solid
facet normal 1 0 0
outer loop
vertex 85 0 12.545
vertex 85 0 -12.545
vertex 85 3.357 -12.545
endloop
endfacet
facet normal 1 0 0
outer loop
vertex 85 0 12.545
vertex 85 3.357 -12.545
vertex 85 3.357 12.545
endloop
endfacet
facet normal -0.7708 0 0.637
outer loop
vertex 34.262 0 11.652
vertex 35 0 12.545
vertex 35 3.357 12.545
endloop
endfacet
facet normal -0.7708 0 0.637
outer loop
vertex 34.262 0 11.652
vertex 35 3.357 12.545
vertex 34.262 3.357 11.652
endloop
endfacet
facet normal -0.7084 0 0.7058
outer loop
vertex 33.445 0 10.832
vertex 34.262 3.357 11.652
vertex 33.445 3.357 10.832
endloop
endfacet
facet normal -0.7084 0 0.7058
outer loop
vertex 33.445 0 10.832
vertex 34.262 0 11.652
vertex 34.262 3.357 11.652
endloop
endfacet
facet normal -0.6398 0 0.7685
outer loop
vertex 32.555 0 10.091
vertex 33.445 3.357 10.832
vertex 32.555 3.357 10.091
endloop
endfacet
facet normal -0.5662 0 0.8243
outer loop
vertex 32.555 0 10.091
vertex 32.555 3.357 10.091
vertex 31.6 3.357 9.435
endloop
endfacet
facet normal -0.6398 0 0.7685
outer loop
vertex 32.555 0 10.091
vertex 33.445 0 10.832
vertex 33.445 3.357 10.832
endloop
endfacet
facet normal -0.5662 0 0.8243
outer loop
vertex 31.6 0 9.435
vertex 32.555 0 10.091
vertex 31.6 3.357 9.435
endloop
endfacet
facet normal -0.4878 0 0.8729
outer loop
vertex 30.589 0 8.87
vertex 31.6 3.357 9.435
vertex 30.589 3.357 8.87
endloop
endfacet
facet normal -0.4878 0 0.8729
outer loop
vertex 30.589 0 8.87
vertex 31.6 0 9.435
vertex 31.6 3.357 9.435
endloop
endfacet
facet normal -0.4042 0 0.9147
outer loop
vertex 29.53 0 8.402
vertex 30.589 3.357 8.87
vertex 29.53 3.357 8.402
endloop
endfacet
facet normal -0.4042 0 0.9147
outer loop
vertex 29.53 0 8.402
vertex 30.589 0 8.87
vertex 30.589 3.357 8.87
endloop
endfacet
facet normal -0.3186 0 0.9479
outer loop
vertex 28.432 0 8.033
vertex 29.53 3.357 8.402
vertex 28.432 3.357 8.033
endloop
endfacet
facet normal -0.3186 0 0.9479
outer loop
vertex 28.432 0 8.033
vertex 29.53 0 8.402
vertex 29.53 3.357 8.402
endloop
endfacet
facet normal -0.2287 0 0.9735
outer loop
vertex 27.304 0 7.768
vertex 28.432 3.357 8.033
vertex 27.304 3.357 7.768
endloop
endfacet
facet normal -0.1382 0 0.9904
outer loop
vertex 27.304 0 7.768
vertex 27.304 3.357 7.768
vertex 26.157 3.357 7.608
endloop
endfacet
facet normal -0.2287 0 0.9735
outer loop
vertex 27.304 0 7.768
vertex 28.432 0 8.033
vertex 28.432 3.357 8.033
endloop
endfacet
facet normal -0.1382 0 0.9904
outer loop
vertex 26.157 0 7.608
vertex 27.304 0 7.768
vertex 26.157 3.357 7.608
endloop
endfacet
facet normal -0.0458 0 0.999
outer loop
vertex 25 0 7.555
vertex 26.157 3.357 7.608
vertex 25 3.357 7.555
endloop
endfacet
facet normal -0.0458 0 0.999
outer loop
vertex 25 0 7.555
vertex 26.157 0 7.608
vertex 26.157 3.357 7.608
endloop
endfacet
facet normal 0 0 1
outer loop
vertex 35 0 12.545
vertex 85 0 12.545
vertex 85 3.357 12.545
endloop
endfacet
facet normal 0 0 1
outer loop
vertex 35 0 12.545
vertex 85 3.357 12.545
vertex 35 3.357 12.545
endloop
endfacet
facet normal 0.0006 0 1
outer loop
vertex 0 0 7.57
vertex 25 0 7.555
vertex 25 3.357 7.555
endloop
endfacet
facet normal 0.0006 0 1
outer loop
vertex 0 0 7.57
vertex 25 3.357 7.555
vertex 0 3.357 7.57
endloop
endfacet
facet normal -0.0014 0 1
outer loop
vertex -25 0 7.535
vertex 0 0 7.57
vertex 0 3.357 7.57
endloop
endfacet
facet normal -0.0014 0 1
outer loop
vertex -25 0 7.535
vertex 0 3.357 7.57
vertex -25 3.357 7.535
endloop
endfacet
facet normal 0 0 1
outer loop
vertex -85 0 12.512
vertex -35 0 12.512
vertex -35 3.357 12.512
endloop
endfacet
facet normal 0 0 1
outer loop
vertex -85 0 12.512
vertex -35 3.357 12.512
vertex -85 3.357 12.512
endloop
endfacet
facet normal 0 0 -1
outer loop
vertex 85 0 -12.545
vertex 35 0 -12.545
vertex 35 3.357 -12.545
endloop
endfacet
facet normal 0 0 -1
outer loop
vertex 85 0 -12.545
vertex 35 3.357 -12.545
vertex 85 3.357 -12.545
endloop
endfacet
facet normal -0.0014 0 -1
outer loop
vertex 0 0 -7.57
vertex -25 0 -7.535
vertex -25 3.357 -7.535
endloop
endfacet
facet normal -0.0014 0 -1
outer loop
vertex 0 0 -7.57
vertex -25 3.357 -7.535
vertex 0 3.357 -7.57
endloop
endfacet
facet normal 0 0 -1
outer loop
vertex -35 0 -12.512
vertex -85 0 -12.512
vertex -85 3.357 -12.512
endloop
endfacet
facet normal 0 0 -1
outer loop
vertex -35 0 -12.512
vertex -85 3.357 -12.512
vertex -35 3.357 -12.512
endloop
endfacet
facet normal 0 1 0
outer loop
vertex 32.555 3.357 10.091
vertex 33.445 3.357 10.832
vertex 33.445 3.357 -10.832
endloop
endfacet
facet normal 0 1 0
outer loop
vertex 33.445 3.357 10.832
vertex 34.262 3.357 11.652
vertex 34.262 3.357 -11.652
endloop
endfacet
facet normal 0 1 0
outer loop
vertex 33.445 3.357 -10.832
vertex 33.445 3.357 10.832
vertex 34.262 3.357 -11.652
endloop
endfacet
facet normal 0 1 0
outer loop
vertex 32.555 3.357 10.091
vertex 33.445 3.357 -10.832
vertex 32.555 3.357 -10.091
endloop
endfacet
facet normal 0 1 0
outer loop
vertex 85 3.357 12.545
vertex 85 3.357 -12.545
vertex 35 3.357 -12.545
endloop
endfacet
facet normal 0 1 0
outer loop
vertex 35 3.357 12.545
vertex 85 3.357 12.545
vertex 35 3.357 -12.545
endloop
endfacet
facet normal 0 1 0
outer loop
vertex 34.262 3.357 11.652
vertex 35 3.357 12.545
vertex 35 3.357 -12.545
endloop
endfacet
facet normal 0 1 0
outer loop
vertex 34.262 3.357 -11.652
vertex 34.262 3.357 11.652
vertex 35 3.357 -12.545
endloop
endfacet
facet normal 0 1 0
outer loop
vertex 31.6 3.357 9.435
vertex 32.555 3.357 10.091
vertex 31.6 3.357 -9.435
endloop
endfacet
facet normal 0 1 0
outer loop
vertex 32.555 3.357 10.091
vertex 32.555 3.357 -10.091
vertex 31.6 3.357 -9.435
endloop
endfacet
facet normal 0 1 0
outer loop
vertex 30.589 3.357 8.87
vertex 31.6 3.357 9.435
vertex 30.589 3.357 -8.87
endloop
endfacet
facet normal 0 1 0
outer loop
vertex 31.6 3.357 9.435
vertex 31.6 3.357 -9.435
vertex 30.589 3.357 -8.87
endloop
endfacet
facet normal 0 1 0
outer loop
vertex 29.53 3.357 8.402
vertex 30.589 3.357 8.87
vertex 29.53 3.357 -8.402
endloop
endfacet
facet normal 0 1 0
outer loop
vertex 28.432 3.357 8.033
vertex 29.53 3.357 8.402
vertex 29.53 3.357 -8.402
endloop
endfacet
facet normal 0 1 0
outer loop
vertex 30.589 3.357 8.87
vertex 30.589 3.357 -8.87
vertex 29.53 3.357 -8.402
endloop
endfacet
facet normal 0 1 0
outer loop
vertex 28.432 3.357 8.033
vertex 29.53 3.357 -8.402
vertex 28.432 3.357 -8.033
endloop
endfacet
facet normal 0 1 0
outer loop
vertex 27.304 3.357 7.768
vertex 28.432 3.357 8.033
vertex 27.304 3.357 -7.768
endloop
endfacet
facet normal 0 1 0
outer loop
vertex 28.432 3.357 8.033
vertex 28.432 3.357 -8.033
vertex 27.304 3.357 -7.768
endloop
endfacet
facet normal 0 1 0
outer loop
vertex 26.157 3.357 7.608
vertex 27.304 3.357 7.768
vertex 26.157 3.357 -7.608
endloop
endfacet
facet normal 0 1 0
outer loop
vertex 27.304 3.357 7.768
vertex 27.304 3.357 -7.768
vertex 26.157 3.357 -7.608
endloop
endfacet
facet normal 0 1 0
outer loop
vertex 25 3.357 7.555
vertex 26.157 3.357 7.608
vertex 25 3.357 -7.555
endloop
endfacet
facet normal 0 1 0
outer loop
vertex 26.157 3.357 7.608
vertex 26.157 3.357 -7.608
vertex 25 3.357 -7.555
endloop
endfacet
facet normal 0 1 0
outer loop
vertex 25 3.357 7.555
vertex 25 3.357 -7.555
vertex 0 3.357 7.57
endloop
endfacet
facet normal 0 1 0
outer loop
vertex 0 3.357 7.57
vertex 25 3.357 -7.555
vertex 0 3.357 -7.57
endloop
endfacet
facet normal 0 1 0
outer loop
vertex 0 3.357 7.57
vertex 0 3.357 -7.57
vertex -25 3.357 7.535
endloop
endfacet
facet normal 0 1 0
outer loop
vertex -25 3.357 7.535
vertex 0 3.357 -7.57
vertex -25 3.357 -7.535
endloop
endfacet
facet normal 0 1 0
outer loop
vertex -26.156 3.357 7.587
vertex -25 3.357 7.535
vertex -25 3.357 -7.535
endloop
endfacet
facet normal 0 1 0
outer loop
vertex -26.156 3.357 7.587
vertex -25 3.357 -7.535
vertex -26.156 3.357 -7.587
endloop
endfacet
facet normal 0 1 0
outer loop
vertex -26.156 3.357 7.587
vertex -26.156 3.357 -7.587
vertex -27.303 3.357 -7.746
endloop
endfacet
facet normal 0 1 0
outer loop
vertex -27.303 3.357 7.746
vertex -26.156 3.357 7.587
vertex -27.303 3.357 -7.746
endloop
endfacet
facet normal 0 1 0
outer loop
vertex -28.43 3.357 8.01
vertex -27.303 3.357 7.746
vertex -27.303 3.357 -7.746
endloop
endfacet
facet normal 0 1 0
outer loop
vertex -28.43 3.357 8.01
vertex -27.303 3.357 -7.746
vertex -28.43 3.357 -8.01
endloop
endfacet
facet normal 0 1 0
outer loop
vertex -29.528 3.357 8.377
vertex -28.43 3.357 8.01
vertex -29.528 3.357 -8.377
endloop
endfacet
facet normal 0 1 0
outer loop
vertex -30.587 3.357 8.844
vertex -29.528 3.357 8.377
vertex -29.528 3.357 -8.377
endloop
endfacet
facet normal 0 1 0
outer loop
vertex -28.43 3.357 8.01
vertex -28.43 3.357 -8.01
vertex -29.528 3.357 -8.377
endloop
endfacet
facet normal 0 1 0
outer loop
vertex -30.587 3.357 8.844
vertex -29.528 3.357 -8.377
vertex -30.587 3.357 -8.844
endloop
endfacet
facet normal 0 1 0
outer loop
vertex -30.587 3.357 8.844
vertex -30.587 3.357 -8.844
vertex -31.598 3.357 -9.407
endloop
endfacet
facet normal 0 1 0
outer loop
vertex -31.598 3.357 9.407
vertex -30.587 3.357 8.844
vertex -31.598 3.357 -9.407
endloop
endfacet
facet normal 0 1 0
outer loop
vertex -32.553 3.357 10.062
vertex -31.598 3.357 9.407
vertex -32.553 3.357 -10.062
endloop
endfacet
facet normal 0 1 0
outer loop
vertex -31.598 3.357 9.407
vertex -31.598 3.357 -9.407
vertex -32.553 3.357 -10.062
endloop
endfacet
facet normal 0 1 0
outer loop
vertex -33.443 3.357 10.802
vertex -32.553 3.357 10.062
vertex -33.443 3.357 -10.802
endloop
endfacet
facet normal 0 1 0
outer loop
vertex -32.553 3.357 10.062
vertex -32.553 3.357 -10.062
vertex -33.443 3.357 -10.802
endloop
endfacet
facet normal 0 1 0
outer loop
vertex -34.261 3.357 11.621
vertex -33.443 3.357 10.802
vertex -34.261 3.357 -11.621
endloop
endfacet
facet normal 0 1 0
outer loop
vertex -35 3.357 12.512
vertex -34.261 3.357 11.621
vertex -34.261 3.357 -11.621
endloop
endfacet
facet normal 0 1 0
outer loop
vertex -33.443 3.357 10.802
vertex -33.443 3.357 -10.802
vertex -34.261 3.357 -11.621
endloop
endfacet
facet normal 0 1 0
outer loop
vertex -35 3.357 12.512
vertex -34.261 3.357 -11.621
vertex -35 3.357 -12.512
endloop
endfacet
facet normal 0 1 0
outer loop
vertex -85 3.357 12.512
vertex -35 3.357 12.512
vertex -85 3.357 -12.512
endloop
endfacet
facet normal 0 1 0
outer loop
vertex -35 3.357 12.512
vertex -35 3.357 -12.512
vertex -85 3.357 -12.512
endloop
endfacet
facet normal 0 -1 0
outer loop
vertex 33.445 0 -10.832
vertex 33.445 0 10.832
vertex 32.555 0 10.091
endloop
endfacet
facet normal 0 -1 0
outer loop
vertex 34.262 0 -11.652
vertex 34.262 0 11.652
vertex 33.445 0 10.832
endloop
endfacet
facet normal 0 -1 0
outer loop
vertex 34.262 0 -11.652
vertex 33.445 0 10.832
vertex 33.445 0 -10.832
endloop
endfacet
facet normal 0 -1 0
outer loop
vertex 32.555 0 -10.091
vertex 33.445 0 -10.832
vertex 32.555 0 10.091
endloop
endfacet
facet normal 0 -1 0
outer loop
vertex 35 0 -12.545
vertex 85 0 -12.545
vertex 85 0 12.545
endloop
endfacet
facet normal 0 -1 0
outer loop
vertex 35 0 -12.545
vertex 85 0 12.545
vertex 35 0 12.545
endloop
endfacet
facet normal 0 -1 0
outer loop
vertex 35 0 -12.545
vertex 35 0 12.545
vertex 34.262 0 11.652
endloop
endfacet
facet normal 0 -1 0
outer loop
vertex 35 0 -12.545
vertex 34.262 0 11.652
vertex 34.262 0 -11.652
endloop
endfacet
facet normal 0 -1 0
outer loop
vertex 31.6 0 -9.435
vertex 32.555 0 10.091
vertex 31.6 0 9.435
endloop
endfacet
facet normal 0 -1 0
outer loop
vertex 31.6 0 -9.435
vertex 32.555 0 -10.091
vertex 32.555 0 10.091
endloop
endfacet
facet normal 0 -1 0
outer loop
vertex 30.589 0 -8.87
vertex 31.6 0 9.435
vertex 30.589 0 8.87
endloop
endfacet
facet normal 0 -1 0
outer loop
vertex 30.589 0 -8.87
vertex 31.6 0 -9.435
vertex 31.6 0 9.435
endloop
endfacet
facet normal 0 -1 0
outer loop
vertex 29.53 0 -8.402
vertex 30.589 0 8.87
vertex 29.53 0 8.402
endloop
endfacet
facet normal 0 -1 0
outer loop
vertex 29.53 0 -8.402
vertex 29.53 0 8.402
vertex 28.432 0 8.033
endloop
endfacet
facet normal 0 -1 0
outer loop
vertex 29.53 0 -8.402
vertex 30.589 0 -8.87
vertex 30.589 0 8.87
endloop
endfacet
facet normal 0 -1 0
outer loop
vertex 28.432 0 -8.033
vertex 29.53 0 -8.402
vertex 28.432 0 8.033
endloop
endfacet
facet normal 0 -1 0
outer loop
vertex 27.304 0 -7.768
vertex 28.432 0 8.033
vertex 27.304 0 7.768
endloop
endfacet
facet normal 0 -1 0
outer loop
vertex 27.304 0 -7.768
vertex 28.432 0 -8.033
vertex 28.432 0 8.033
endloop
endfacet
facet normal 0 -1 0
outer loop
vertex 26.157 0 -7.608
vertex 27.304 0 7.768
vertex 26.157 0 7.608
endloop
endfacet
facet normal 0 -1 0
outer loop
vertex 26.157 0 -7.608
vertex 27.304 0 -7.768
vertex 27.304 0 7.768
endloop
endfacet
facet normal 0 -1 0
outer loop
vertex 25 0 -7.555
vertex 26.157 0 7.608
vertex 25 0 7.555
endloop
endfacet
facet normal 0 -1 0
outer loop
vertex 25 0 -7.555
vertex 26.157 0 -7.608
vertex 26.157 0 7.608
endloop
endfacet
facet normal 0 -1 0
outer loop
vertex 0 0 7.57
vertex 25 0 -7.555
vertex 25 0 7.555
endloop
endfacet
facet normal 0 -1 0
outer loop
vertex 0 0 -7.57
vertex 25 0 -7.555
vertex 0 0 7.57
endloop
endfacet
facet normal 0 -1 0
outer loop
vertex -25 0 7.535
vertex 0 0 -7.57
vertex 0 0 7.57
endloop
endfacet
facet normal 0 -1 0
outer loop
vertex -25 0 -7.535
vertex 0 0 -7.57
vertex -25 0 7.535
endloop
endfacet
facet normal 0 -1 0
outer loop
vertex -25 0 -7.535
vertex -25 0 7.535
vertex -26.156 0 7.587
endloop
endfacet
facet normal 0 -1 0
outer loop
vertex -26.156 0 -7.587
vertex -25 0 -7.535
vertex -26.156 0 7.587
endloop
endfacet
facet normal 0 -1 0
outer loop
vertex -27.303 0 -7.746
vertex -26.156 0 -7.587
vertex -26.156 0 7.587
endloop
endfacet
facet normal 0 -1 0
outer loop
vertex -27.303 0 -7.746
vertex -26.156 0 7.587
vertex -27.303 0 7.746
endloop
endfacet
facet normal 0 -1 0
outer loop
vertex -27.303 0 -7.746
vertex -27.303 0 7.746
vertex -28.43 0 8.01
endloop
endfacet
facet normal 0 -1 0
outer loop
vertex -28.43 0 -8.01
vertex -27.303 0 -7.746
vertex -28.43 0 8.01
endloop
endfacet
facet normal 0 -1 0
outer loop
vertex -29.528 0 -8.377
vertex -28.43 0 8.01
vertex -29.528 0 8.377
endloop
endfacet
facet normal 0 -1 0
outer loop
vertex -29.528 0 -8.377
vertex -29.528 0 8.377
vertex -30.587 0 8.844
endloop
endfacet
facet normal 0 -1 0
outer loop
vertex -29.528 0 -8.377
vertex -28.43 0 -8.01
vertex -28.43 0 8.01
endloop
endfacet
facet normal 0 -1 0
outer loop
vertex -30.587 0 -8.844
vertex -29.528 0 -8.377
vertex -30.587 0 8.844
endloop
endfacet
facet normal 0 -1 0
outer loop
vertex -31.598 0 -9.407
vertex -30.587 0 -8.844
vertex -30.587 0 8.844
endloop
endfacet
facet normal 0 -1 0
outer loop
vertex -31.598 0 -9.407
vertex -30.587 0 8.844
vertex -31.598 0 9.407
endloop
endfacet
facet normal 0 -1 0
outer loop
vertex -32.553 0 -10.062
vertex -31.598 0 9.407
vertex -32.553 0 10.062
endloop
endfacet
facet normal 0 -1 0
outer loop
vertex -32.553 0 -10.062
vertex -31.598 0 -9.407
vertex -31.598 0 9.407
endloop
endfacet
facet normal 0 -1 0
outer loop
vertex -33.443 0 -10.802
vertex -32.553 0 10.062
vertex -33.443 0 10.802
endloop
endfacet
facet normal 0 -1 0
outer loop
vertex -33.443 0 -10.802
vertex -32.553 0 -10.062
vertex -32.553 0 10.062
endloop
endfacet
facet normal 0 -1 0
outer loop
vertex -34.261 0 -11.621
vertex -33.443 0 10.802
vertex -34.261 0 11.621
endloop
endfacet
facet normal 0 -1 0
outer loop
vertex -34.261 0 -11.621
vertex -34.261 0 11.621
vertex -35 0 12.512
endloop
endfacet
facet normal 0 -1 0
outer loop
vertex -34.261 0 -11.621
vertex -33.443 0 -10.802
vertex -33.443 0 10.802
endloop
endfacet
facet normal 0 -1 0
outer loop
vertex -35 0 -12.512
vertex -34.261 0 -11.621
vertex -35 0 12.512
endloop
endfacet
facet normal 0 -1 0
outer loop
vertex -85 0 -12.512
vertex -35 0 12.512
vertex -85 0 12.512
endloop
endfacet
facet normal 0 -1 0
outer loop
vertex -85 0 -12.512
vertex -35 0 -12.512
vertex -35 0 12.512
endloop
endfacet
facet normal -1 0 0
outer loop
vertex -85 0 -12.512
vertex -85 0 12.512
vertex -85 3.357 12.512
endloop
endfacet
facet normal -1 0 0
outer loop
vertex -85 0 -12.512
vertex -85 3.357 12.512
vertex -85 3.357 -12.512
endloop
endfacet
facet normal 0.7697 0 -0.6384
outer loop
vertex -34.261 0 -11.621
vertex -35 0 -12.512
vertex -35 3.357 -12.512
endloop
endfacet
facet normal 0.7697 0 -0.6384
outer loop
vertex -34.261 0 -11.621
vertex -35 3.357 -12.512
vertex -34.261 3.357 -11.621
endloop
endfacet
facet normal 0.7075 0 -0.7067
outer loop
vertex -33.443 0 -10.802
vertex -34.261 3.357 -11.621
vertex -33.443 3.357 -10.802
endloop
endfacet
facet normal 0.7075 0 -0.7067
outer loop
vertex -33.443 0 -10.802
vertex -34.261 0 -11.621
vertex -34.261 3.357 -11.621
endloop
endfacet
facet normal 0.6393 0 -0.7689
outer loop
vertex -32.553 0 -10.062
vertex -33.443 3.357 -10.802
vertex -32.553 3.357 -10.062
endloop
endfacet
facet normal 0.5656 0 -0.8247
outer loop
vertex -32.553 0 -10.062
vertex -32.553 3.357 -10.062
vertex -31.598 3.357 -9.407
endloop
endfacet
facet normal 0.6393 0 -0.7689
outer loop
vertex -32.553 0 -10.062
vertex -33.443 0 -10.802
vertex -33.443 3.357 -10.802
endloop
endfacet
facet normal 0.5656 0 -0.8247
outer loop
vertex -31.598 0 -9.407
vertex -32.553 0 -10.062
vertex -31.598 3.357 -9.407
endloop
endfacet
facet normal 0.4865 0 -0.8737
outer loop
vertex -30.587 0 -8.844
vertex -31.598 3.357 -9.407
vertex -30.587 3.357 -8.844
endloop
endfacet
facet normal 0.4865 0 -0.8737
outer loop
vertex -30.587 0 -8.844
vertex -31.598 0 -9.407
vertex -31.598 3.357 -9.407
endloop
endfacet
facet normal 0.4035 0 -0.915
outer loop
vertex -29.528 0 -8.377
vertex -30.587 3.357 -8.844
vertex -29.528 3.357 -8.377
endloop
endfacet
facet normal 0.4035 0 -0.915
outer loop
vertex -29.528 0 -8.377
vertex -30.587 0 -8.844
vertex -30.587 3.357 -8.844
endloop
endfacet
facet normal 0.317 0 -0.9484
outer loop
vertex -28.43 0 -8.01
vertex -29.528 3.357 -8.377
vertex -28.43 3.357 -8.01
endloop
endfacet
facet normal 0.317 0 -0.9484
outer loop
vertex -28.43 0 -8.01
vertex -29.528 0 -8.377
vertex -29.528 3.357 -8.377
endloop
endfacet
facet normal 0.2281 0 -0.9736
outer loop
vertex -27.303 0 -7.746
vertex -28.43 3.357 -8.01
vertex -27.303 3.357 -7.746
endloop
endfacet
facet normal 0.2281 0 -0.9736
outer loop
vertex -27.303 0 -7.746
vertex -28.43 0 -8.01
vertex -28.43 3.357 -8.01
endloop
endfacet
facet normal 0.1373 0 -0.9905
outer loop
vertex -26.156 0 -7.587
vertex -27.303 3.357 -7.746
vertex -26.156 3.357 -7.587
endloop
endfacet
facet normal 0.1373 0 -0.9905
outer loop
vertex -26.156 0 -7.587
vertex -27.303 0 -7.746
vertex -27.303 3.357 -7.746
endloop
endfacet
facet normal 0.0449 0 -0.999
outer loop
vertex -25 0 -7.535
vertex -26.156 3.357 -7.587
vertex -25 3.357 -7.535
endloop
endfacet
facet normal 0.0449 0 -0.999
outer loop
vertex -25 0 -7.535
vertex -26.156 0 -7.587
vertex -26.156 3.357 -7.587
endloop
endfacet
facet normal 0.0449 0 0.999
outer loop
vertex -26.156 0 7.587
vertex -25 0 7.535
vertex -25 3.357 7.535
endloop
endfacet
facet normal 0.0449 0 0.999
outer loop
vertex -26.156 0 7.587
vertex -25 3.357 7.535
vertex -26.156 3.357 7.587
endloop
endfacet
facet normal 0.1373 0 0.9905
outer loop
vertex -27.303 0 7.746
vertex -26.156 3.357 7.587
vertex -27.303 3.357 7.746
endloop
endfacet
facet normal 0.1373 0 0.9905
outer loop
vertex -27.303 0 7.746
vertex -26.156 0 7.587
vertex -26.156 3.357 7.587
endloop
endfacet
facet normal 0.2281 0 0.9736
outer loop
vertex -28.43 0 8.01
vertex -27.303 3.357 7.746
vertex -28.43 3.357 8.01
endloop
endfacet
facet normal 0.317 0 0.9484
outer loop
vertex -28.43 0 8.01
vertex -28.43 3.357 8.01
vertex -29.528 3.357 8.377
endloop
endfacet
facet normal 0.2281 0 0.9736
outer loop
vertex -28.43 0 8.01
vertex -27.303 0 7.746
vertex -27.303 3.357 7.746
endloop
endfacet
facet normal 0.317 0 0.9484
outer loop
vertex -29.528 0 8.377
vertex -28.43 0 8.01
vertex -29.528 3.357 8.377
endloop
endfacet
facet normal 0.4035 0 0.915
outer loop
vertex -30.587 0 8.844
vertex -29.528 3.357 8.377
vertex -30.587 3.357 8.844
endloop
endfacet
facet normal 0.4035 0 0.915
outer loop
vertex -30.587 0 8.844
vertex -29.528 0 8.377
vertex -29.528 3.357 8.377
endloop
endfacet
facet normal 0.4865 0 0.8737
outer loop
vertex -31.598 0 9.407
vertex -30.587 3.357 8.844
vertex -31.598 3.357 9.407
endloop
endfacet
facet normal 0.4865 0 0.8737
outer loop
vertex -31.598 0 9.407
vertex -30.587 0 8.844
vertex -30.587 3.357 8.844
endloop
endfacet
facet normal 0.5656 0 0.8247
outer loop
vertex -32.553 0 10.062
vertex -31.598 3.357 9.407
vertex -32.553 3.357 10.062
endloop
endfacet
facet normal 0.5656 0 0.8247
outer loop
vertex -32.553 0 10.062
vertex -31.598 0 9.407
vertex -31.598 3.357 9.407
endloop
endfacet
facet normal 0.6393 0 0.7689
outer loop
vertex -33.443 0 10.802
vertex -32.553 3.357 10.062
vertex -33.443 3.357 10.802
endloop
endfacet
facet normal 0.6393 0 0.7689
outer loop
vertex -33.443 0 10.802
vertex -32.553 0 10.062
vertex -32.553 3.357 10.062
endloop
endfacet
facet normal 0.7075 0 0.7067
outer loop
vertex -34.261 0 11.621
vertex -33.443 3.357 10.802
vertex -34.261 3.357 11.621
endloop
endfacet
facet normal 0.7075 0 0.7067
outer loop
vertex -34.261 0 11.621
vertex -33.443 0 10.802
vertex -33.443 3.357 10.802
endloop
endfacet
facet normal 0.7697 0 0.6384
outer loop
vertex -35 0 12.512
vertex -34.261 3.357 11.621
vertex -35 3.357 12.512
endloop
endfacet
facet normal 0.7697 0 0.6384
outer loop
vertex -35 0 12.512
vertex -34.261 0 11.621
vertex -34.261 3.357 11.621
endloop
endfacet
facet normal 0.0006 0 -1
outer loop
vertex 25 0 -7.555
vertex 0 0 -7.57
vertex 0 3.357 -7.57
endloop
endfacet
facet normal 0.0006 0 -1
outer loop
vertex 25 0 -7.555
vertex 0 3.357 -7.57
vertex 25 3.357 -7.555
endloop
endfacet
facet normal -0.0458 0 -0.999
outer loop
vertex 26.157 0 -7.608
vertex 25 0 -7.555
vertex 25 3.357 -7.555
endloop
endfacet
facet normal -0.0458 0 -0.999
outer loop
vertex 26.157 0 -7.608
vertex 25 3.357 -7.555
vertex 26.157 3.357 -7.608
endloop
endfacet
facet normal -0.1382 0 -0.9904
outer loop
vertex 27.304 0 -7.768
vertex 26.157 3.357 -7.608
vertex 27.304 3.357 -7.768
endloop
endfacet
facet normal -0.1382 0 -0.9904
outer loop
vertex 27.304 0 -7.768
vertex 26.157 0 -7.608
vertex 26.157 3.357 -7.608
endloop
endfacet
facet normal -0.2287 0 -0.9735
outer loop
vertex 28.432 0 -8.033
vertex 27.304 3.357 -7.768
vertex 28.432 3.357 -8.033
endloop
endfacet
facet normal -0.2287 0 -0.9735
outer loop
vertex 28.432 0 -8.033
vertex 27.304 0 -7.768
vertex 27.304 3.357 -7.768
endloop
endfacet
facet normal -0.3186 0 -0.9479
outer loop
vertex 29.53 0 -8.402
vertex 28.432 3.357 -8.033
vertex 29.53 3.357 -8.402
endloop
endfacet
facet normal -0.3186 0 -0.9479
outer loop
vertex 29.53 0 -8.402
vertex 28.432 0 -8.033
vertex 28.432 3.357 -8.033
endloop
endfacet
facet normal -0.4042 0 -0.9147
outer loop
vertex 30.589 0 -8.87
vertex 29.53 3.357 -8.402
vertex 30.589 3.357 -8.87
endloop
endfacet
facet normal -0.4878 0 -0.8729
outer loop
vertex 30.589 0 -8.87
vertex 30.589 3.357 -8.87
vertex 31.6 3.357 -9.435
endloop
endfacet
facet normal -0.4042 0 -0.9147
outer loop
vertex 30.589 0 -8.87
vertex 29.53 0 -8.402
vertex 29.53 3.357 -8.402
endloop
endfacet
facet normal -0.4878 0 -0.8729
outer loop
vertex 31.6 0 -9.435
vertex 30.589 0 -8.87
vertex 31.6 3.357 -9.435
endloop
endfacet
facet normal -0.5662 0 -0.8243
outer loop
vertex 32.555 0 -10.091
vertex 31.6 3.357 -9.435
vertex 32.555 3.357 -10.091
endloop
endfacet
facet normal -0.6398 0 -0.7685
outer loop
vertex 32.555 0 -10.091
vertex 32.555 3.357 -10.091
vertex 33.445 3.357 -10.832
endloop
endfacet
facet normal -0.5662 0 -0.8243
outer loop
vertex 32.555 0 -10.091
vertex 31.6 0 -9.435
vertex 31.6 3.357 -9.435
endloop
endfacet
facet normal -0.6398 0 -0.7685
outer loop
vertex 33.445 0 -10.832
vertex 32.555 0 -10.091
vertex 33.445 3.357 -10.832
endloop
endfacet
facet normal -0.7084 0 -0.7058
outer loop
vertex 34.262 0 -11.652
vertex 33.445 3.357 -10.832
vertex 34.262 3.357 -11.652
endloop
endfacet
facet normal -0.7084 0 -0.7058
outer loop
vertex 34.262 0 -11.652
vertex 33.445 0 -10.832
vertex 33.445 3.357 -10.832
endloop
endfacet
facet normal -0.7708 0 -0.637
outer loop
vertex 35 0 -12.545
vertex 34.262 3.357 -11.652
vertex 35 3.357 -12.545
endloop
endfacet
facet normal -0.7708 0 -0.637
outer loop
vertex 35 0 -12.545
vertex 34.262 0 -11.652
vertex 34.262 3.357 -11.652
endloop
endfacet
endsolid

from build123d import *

# Parameters (mm, degrees)
BOSS_EXTRUDE2_DEPTH = 3.357


with BuildPart() as part:
    # Sketch1 → Boss-Extrude2 (new body)
    with BuildSketch(Plane(origin=(0, 0, 0), x_dir=(1, 0, 0), z_dir=(0, 1, 0))):
        with BuildLine():
            Line((35, 12.545008155), (85, 12.545008155))
            Line((85, 12.545008155), (85, -12.545008155))
            Line((85, -12.545008155), (35, -12.545008155))
            ThreePointArc((35, -12.545008155), (30.588727606, -8.870191163), (25, -7.555))
            Line((25, -7.555), (0, -7.57))
            Line((0, -7.57), (-25, -7.535))
            ThreePointArc((-25, -7.535), (-30.586810484, -8.844242442), (-35, -12.511710977))
            Line((-35, -12.511710977), (-85, -12.511710977))
            Line((-85, -12.511710977), (-85, 12.511710977))
            Line((-85, 12.511710977), (-35, 12.511710977))
            ThreePointArc((-35, 12.511710977), (-30.586810484, 8.844242442), (-25, 7.535))
            Line((-25, 7.535), (0, 7.57))
            Line((0, 7.57), (25, 7.555))
            ThreePointArc((25, 7.555), (30.588727606, 8.870191163), (35, 12.545008155))
        make_face()
    extrude(amount=BOSS_EXTRUDE2_DEPTH)


solid = part.part
